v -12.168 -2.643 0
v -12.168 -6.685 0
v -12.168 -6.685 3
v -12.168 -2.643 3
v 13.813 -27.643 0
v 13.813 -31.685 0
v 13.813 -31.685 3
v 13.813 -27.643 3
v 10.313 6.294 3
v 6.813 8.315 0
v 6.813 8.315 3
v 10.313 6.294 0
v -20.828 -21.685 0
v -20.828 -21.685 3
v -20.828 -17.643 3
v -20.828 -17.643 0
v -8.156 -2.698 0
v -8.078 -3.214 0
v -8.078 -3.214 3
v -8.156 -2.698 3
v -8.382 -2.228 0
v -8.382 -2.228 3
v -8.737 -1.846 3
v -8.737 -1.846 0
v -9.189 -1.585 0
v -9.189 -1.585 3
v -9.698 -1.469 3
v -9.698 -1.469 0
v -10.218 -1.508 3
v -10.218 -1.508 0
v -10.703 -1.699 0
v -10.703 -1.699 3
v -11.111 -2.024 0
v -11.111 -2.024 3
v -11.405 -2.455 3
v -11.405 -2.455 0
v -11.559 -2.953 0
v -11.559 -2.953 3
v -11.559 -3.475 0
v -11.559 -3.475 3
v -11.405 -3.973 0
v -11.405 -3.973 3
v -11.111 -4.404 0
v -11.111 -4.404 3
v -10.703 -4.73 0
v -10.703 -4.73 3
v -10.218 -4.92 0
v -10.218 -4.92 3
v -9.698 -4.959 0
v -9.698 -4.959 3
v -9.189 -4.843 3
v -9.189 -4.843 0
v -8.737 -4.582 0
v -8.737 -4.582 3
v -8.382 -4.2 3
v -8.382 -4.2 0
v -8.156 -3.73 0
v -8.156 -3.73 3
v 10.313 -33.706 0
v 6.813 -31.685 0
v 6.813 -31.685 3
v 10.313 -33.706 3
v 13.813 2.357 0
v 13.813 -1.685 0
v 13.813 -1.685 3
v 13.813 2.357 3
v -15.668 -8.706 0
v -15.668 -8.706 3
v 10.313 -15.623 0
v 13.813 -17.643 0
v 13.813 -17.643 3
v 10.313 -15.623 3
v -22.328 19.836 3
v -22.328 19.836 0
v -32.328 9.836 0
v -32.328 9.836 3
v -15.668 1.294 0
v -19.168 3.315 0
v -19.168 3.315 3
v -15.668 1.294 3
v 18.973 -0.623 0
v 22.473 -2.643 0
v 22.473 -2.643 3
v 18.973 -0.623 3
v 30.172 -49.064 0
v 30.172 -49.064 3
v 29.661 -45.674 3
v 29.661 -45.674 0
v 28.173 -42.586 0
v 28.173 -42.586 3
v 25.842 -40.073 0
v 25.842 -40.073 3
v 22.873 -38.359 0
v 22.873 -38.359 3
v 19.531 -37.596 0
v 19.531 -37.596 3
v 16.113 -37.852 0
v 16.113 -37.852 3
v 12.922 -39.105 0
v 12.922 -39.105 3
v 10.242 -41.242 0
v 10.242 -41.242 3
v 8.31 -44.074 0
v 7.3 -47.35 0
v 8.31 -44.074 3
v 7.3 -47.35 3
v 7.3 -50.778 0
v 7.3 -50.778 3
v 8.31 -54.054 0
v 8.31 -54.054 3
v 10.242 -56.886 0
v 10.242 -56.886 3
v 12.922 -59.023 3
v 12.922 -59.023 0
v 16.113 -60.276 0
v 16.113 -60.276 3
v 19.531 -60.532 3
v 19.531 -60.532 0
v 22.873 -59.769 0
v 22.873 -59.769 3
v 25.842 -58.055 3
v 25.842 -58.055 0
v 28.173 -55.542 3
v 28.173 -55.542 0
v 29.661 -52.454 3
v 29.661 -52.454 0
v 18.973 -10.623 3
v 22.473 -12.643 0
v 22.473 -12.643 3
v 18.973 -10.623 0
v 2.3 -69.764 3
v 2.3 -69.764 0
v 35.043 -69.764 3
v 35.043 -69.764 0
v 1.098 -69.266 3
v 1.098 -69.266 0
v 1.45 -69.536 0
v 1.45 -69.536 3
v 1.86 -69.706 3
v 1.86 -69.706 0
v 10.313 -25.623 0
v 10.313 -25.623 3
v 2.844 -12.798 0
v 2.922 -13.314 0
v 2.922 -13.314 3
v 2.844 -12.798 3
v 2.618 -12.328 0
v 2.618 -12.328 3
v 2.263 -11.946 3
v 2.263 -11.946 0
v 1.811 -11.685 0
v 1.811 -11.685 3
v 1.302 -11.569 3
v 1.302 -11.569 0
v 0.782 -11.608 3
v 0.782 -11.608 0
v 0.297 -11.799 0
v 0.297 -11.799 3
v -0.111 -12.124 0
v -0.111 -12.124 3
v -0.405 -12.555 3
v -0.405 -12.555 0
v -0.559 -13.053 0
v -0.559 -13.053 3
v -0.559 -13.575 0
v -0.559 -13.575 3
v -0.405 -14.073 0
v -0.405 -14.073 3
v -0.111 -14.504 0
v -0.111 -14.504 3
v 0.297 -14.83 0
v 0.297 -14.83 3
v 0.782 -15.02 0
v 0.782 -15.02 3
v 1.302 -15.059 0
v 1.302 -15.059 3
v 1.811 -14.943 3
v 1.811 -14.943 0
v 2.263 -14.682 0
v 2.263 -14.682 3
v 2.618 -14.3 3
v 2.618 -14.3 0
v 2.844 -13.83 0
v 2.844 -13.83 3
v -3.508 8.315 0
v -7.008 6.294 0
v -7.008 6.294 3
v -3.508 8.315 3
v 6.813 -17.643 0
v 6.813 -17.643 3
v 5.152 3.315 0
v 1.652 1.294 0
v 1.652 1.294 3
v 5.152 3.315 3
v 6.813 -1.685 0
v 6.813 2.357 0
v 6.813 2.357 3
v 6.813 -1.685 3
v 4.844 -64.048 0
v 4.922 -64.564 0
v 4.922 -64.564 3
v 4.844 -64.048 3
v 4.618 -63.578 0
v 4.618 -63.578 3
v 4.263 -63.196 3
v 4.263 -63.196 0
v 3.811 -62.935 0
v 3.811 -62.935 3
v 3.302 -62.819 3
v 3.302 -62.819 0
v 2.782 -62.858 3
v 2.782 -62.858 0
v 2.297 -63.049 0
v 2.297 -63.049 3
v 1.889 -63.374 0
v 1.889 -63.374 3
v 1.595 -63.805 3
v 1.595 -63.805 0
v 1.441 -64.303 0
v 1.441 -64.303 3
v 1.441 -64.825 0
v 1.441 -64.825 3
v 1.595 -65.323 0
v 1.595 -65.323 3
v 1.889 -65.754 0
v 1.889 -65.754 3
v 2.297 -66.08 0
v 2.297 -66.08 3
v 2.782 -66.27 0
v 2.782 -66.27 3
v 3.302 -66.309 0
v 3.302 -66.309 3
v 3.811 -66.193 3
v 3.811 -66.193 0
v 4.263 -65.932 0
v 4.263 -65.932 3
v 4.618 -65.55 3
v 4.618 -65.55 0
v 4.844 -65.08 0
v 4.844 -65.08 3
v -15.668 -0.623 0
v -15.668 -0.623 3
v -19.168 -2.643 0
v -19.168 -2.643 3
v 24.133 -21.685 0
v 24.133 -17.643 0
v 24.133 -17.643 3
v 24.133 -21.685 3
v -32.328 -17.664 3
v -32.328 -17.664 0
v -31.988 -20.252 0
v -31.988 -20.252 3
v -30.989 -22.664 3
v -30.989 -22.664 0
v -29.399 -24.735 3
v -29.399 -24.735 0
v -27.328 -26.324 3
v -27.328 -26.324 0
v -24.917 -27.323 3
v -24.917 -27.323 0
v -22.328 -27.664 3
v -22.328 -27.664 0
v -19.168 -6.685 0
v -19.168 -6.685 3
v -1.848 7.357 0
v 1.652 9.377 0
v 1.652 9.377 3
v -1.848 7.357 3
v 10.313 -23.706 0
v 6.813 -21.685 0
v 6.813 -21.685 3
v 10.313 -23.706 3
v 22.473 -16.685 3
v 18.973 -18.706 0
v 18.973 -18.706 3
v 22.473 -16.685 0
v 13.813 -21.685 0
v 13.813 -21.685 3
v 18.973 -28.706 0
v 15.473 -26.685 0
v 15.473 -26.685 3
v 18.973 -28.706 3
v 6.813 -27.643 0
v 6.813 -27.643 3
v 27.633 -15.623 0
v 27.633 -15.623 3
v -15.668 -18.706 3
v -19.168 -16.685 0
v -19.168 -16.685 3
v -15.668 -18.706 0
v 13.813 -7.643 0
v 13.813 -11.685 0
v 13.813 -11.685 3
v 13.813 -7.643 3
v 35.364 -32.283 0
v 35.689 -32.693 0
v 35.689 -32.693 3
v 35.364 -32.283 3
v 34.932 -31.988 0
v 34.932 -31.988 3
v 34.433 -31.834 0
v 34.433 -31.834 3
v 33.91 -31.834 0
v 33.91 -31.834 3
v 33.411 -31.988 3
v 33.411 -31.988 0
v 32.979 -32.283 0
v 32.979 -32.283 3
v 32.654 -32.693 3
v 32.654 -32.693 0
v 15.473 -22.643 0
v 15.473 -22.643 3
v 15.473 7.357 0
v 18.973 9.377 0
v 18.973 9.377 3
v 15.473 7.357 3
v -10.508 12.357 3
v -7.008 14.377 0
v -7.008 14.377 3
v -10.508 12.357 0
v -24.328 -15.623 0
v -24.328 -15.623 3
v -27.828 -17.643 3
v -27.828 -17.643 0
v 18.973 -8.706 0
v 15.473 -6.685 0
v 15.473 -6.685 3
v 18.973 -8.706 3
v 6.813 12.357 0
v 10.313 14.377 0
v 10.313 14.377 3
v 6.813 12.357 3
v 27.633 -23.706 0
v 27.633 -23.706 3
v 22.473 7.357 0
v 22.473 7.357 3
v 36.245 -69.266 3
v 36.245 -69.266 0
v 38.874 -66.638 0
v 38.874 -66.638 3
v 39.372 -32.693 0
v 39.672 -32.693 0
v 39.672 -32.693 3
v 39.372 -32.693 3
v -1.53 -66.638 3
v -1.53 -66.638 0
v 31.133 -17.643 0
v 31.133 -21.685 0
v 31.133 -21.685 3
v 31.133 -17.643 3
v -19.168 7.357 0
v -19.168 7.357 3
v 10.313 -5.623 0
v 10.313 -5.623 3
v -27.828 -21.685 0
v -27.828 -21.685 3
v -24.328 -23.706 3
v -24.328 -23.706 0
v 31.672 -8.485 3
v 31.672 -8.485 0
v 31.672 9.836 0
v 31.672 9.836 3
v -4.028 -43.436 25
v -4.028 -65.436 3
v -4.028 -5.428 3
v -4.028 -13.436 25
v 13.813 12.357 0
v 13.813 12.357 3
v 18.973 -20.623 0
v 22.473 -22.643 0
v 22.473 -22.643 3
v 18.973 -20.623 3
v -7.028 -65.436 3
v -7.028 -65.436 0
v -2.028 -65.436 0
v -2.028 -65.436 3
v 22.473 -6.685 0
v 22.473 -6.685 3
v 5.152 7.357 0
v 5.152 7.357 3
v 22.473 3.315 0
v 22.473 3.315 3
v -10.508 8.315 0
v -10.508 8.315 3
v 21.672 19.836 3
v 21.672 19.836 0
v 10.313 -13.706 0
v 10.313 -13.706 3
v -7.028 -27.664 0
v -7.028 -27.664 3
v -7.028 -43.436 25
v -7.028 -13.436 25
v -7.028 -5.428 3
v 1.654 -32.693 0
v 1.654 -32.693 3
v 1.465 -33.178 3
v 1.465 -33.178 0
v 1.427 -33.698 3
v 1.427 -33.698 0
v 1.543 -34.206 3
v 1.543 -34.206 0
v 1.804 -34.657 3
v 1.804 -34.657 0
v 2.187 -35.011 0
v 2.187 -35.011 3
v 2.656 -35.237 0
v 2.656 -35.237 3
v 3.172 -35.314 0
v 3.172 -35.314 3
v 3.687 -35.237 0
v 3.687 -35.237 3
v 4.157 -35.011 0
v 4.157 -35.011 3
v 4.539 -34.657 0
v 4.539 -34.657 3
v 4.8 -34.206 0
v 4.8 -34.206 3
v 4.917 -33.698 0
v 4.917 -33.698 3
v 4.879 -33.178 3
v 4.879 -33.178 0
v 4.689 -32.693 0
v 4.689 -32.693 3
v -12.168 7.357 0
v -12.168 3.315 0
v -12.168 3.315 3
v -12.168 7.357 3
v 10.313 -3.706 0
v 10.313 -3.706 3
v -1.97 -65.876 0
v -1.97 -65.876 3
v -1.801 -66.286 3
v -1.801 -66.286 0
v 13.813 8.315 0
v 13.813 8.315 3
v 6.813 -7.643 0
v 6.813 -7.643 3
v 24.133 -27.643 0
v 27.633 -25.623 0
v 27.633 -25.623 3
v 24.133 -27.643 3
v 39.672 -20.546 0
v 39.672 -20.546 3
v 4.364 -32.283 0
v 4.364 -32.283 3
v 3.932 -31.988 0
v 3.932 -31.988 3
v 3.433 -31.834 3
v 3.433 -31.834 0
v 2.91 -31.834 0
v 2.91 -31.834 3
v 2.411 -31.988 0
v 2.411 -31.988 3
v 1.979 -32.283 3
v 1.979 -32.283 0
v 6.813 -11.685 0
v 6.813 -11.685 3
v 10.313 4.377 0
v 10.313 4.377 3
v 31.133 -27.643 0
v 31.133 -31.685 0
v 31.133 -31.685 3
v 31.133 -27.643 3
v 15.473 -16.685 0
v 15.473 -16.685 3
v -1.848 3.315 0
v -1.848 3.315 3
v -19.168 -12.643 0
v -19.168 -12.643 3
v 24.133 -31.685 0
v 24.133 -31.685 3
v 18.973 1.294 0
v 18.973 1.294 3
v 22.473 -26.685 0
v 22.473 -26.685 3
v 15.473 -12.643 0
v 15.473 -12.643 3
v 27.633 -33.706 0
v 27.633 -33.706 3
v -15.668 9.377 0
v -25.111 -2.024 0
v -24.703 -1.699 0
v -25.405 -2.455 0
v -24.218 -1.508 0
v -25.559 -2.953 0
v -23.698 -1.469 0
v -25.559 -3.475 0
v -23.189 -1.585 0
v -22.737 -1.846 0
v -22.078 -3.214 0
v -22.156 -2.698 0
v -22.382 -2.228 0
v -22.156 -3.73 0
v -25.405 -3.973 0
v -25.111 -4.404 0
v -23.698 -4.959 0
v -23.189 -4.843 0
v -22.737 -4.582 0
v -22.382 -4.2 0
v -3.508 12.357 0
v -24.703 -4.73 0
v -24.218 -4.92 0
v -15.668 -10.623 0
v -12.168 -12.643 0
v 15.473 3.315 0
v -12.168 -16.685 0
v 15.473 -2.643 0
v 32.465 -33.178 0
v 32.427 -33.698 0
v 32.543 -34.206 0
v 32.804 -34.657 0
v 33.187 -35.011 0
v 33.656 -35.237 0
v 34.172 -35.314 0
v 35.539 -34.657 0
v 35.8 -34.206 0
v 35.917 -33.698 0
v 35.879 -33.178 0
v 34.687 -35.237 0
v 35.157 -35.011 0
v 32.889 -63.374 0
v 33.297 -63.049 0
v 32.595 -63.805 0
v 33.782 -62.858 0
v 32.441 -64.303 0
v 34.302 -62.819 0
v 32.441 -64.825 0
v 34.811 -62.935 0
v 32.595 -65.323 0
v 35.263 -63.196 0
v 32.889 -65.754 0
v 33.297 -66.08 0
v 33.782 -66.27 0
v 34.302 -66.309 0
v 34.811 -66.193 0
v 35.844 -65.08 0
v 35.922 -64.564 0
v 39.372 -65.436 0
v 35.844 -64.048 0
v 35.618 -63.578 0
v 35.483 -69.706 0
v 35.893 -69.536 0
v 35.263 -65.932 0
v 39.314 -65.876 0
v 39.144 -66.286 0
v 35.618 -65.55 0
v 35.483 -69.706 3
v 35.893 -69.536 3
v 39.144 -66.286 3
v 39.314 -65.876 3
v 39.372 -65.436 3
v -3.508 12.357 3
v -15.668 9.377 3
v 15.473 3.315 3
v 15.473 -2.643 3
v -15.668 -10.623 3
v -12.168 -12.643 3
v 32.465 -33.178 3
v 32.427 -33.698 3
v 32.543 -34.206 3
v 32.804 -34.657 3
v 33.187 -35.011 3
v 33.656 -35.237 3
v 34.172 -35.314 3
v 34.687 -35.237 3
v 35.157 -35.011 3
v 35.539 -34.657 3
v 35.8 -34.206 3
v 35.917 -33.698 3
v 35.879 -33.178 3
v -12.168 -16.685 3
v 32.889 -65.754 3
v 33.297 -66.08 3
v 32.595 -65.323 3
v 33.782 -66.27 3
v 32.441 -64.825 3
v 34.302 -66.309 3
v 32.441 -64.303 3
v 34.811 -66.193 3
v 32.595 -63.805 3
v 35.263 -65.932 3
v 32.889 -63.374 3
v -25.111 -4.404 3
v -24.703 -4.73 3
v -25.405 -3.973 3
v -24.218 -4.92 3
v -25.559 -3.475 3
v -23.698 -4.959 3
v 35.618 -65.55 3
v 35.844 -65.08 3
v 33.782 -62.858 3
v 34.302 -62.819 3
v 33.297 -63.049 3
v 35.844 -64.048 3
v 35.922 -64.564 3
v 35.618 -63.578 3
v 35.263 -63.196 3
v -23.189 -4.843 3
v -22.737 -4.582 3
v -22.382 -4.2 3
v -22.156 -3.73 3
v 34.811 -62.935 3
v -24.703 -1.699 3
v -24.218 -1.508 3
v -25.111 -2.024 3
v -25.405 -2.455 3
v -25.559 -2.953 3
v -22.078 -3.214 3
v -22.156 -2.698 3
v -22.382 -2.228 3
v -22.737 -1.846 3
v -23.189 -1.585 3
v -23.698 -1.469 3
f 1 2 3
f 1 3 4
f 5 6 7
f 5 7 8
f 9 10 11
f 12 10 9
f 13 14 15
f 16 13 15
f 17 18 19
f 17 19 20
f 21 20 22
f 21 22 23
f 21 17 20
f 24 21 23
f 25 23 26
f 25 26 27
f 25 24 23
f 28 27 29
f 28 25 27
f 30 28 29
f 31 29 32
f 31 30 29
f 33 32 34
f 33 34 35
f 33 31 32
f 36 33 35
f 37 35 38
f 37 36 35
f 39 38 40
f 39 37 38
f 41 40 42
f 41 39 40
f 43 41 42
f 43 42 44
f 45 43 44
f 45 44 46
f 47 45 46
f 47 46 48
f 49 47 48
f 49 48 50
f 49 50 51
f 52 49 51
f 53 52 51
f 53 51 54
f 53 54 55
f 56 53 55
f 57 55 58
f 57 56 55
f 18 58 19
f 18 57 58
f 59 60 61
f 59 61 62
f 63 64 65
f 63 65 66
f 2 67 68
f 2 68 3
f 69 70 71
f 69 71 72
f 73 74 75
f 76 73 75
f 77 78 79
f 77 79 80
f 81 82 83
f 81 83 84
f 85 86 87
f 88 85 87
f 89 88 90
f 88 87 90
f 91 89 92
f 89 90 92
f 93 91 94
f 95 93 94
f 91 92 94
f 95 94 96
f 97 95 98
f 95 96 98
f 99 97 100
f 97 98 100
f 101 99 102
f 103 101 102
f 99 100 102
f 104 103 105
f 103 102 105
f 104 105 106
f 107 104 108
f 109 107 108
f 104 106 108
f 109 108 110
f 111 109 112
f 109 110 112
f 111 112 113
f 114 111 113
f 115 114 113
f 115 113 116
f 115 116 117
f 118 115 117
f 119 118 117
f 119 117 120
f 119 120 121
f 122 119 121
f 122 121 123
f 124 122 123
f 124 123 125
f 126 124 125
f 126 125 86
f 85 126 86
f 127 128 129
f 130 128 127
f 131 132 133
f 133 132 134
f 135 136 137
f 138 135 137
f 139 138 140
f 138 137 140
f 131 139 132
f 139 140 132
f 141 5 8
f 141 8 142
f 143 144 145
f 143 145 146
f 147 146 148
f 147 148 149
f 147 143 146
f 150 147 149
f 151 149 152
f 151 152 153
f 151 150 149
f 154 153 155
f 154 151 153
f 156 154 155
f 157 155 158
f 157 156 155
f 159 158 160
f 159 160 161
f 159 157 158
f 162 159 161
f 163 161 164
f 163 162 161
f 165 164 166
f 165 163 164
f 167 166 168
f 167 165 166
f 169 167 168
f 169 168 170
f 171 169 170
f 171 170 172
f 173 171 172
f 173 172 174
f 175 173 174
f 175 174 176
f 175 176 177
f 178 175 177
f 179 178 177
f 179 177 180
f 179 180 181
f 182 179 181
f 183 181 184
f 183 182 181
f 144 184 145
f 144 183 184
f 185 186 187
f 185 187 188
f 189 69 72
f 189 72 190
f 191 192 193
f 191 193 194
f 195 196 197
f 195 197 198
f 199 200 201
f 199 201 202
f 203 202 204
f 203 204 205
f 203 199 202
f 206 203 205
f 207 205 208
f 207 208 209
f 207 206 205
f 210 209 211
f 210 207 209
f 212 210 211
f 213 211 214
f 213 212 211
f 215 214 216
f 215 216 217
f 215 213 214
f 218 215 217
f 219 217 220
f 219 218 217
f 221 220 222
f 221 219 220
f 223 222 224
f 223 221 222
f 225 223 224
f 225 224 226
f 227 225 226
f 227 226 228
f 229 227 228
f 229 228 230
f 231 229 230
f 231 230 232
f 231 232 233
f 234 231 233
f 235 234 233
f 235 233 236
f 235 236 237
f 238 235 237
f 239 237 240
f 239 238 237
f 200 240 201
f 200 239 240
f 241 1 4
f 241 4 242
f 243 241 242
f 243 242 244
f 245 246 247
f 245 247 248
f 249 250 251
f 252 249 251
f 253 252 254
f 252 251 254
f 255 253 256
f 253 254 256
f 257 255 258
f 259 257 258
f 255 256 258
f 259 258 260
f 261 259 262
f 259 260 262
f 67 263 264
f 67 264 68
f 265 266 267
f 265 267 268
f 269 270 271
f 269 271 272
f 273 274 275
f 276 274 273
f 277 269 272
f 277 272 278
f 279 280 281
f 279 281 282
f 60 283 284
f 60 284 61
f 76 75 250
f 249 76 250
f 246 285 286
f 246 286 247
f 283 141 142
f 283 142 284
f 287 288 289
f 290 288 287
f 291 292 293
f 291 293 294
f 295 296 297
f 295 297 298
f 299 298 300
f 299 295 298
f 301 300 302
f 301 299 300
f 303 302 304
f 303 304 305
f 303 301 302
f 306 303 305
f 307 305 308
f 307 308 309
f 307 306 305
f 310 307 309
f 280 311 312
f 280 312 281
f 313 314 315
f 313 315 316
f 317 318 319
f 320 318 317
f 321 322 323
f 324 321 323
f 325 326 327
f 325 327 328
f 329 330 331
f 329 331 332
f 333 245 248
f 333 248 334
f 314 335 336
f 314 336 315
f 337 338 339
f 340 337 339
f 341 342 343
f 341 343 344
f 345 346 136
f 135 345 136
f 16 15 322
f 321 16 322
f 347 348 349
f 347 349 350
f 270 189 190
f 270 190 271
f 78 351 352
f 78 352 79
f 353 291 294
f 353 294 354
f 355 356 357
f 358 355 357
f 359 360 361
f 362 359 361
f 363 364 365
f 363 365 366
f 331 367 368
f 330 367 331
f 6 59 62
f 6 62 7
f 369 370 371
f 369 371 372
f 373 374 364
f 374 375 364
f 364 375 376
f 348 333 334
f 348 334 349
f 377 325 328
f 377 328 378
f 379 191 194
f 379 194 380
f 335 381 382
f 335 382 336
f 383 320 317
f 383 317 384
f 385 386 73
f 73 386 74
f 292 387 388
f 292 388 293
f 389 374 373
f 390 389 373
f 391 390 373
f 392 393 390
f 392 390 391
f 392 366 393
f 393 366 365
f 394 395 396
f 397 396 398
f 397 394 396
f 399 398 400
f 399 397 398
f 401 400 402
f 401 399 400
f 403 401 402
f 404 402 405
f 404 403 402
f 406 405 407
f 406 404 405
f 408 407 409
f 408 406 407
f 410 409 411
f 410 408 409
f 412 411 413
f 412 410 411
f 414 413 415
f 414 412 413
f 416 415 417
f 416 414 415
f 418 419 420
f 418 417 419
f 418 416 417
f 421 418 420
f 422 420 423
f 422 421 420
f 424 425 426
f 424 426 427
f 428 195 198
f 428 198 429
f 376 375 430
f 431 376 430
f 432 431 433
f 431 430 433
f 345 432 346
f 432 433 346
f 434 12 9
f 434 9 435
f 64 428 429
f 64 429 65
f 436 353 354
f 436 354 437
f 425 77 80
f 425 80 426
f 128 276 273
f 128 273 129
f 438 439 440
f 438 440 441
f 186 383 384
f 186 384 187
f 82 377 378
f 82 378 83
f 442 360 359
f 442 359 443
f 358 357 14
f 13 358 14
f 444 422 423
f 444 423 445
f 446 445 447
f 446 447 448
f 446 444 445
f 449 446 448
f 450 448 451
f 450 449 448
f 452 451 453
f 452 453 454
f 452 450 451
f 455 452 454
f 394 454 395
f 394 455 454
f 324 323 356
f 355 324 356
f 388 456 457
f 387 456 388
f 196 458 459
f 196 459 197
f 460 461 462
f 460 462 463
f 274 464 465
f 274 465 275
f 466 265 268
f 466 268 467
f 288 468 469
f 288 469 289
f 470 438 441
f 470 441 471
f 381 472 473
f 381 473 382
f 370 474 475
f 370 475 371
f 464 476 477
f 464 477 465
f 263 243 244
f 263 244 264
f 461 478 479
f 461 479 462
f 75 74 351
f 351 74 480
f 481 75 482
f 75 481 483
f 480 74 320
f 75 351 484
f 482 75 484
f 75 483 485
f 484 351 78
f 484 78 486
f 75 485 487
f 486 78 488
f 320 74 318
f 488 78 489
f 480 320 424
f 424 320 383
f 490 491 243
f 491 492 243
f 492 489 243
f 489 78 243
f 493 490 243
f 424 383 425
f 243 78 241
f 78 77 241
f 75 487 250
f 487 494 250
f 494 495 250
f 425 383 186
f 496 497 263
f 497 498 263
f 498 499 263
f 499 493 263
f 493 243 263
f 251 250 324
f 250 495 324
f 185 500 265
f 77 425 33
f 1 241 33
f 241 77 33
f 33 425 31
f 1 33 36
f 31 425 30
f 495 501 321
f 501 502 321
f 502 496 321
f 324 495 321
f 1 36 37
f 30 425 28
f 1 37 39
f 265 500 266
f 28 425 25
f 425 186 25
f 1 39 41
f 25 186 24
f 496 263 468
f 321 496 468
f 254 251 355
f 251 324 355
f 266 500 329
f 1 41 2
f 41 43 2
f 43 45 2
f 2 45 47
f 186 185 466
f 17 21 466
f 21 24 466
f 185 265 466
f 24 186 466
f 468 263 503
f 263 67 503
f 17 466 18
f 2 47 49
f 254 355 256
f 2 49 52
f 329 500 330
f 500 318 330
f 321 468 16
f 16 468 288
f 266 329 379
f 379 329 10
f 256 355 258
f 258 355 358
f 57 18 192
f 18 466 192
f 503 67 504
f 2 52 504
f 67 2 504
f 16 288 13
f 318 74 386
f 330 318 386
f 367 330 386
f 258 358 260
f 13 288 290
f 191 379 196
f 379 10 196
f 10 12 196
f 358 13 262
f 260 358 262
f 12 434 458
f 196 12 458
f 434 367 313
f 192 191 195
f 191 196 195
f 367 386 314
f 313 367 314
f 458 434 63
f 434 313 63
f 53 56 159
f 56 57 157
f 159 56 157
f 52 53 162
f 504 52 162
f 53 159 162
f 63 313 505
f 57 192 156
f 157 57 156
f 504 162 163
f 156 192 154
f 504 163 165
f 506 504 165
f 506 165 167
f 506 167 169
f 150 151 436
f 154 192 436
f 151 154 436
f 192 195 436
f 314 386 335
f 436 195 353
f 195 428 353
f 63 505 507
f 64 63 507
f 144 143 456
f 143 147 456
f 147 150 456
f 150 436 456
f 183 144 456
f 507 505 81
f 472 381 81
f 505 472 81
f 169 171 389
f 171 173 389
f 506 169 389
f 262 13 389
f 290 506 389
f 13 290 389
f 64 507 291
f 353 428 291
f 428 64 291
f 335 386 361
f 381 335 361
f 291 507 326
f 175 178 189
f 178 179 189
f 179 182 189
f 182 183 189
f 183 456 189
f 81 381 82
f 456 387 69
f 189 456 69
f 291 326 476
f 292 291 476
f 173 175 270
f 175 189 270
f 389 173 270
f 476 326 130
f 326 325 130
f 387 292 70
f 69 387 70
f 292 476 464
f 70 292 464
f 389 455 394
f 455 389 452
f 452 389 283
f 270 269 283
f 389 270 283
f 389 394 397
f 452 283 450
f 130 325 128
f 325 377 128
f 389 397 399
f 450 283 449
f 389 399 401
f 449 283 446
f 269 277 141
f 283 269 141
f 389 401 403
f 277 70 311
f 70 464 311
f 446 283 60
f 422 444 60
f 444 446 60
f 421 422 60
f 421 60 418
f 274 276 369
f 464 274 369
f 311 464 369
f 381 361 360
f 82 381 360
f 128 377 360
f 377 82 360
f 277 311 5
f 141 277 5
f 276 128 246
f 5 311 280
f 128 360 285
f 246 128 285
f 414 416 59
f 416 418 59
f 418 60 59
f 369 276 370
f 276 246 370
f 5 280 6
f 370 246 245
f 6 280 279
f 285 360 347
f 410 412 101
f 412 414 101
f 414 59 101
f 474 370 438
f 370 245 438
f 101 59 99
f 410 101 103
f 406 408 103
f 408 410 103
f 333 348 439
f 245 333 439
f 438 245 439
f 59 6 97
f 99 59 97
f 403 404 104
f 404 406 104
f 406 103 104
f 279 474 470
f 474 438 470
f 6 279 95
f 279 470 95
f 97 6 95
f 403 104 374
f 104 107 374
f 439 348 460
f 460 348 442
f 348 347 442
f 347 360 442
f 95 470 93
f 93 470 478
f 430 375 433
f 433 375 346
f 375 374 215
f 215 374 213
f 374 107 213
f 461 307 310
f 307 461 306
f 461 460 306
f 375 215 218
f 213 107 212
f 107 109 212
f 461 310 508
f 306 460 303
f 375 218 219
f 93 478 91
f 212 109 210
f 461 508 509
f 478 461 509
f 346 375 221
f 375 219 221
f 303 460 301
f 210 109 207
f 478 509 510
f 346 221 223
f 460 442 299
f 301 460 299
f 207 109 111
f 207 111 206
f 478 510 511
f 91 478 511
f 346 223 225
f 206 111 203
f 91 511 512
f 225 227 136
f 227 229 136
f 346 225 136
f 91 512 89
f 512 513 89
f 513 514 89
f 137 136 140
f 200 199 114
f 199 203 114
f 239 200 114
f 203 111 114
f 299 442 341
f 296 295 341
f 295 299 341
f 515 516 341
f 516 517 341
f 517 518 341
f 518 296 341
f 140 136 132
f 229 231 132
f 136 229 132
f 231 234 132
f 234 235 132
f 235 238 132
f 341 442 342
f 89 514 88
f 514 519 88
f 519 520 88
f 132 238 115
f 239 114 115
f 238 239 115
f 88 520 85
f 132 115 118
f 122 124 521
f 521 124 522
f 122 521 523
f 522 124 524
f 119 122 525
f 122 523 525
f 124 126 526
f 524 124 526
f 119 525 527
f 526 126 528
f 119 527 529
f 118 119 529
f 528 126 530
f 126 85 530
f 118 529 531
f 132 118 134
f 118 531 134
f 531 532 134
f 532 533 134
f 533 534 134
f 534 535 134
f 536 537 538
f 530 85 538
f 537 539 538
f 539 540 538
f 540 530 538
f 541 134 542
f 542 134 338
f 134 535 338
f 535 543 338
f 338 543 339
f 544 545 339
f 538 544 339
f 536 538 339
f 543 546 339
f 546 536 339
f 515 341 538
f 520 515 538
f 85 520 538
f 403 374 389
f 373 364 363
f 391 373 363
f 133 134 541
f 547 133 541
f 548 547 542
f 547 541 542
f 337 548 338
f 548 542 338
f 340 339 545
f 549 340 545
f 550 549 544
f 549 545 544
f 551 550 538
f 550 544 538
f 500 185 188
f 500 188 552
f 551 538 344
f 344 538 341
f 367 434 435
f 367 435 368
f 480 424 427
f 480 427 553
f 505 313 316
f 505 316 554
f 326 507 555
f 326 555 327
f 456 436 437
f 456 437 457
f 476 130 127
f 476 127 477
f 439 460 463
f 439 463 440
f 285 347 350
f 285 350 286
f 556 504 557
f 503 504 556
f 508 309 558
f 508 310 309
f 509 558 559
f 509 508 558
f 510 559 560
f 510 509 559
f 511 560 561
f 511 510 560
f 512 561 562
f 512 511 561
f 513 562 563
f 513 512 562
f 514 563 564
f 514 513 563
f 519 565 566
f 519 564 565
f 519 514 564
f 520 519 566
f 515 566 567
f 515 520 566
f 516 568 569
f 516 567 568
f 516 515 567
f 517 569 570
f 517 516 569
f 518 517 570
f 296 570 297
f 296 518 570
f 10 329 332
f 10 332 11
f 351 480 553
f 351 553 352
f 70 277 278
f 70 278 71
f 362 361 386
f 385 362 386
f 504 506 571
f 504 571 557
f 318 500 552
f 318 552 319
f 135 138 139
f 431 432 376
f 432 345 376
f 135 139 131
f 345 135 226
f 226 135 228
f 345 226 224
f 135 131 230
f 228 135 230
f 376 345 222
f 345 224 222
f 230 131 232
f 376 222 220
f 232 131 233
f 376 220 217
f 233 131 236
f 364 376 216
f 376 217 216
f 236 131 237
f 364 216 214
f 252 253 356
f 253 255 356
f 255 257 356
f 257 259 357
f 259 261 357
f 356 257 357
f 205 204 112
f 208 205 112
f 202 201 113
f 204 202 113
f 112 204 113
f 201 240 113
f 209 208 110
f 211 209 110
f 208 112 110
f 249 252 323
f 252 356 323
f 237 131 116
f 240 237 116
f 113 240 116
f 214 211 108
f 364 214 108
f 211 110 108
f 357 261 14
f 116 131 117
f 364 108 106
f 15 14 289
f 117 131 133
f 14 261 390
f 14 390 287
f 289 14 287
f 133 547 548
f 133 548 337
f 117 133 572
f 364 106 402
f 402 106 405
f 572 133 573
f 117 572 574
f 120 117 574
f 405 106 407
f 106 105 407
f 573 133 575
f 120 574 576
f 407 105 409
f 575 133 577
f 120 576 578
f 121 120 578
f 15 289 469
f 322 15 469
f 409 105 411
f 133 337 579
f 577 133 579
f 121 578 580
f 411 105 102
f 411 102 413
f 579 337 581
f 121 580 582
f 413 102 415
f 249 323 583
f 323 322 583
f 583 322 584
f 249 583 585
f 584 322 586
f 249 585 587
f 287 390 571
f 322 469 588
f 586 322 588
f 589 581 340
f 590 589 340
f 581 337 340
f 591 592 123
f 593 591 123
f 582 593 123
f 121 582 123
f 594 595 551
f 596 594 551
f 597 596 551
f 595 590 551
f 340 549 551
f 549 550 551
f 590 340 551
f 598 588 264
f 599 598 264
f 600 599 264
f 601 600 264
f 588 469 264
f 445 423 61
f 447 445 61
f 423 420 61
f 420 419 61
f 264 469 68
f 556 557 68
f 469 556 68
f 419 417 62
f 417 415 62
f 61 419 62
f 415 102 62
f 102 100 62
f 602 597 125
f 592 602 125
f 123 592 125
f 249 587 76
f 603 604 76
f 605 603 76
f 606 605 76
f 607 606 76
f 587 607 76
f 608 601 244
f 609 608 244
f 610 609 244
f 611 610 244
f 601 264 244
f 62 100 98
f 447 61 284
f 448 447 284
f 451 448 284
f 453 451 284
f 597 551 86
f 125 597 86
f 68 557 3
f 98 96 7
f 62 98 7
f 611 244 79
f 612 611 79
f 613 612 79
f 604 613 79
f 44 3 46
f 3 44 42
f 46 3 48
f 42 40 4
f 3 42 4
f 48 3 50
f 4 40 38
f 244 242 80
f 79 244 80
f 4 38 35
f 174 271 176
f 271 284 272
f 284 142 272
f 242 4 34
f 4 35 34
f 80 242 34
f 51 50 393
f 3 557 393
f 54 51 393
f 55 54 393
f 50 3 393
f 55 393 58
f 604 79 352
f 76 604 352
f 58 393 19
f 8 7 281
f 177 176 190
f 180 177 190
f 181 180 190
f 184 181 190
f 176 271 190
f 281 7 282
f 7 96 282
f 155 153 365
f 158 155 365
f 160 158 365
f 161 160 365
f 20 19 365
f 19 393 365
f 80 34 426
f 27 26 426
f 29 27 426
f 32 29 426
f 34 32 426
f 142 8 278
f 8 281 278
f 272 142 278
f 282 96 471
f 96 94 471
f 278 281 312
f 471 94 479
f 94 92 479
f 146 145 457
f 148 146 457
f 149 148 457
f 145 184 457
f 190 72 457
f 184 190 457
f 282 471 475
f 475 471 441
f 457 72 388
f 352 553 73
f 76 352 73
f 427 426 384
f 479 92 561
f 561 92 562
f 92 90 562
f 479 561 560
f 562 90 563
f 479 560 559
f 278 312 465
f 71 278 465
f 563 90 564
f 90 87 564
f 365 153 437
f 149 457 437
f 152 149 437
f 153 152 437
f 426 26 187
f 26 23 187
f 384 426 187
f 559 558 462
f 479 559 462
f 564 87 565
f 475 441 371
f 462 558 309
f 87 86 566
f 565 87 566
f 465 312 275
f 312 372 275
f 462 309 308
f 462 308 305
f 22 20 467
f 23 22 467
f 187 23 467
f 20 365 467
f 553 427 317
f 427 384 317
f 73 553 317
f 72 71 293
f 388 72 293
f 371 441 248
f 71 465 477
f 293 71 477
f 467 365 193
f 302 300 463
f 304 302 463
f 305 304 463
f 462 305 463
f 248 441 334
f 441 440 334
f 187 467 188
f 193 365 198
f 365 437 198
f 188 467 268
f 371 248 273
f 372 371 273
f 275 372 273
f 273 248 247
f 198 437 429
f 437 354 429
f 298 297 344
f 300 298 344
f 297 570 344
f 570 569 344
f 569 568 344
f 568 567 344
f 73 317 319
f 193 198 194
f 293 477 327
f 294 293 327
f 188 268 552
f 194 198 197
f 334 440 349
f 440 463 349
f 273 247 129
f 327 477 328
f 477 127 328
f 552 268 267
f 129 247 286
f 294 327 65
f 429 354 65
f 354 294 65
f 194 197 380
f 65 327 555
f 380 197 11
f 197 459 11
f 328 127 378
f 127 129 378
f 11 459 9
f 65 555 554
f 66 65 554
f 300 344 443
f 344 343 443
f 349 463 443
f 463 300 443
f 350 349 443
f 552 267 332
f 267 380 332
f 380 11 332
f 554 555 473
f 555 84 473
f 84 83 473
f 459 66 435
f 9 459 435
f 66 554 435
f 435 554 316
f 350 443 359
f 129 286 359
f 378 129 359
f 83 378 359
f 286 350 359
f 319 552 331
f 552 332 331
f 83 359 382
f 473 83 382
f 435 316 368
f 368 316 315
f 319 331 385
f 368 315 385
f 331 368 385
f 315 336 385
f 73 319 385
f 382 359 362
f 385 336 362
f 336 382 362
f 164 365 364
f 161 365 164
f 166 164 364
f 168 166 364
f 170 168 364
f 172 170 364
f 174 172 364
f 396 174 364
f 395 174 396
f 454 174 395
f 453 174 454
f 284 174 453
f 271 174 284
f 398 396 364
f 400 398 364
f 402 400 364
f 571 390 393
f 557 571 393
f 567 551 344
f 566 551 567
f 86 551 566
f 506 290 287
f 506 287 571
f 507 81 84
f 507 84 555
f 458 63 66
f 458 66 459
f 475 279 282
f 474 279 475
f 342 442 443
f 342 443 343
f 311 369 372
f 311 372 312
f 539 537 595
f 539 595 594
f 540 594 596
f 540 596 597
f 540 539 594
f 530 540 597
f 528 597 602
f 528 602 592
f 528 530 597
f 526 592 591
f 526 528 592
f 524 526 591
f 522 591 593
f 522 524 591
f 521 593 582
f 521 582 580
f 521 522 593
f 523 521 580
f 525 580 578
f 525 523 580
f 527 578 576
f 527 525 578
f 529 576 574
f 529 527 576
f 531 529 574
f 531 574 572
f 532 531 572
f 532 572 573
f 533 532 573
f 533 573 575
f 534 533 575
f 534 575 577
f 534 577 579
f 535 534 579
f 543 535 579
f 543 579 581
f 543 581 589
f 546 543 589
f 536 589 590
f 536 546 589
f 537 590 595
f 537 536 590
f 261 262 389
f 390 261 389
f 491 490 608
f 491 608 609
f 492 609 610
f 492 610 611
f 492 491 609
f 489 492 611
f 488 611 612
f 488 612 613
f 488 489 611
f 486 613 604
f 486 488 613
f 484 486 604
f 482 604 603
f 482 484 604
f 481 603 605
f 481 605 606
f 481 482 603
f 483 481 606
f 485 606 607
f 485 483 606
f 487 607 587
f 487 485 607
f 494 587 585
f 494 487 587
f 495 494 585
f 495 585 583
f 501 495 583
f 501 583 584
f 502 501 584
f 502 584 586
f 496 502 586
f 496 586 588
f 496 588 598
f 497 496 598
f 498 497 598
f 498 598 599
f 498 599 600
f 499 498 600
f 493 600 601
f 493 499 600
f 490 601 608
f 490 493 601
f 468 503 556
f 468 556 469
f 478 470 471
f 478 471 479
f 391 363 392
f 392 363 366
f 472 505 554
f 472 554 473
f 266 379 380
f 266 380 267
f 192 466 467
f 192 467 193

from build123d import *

# Parameters (mm, degrees)
SKETCH2_R               = 1.75
BOSS_EXTRUDE1_DEPTH     = 3
BOSS_EXTRUDE1_2_DEPTH   = 3
BOSS_EXTRUDE2_START     = -3
BOSS_EXTRUDE2_DEPTH     = 3
SKETCH5_W               = 3
SKETCH5_H               = 37.771572876
BOSS_EXTRUDE3_DEPTH     = 2
BOSS_EXTRUDE4_DEPTH     = 3
CUT_EXTRUDE1_DEPTH      = 10
SKETCH9_R               = 11.5
CUT_EXTRUDE2_DEPTH      = 10
FILL_PATTERN1_OUTLINE_R = 1.75
FILL_PATTERN1_DEPTH     = 3


# Read off the part's stored shape, not the designer's step: Fill Pattern1
with BuildPart() as part:
    # Sketch2 → Boss-Extrude1 (new body)
    with BuildSketch(Plane.XY):
        with BuildLine():
            Line((31.67162959, -17.664113805), (31.67162959, 9.835886195))
            Line((31.67162959, 9.835886195), (21.67162959, 19.835886195))
            Line((21.67162959, 19.835886195), (-22.32837041, 19.835886195))
            Line((-22.32837041, 19.835886195), (-32.32837041, 9.835886195))
            Line((-32.32837041, 9.835886195), (-32.32837041, -17.664113805))
            ThreePointArc((-32.32837041, -17.664113805), (-29.399438222, -24.735181617), (-22.32837041, -27.664113805))
            Line((-22.32837041, -27.664113805), (21.67162959, -27.664113805))
            ThreePointArc((21.67162959, -27.664113805), (28.742697402, -24.735181617), (31.67162959, -17.664113805))
        make_face()
        with Locations((18.67162959, 5.585886195)):
            Circle(SKETCH2_R, mode=Mode.SUBTRACT)
        with Locations((1.17162959, -13.314113805)):
            Circle(SKETCH2_R, mode=Mode.SUBTRACT)
        with Locations((-23.82837041, -3.214113805)):
            Circle(SKETCH2_R, mode=Mode.SUBTRACT)
        with Locations((-9.82837041, -3.214113805)):
            Circle(SKETCH2_R, mode=Mode.SUBTRACT)
    extrude(amount=BOSS_EXTRUDE1_DEPTH)



with BuildPart() as body_2:
    # Sketch2 → Boss-Extrude1 2 (new body)
    with BuildSketch(Plane.XY):
        with BuildLine():
            Line((-2.02837041, -32.69254093), (-2.02837041, -65.435686681))
            ThreePointArc((-2.02837041, -65.435686681), (-1.898965615, -66.086248516), (-1.530451938, -66.637768209))
            Line((-1.530451938, -66.637768209), (1.097975187, -69.266195333))
            ThreePointArc((1.097975187, -69.266195333), (1.64949488, -69.634709011), (2.300056715, -69.764113805))
            Line((2.300056715, -69.764113805), (35.043202465, -69.764113805))
            ThreePointArc((35.043202465, -69.764113805), (35.6937643, -69.634709011), (36.245283993, -69.266195333))
            Line((36.245283993, -69.266195333), (38.873711118, -66.637768209))
            ThreePointArc((38.873711118, -66.637768209), (39.242224795, -66.086248516), (39.37162959, -65.435686681))
            Line((39.37162959, -65.435686681), (39.37162959, -32.69254093))
            ThreePointArc((39.37162959, -32.69254093), (39.242224795, -32.041979095), (38.873711118, -31.490459402))
            Line((38.873711118, -31.490459402), (36.245283993, -28.862032277))
            ThreePointArc((36.245283993, -28.862032277), (35.6937643, -28.4935186), (35.043202465, -28.364113805))
            Line((35.043202465, -28.364113805), (2.300056715, -28.364113805))
            ThreePointArc((2.300056715, -28.364113805), (1.64949488, -28.4935186), (1.097975187, -28.862032277))
            Line((1.097975187, -28.862032277), (-1.530451938, -31.490459402))
            ThreePointArc((-1.530451938, -31.490459402), (-1.898965615, -32.041979095), (-2.02837041, -32.69254093))
        make_face()
        with Locations((34.17162959, -33.564113805)):
            Circle(SKETCH2_R, mode=Mode.SUBTRACT)
        with Locations((3.17162959, -33.564113805)):
            Circle(SKETCH2_R, mode=Mode.SUBTRACT)
        with Locations((34.17162959, -64.564113805)):
            Circle(SKETCH2_R, mode=Mode.SUBTRACT)
        with Locations((3.17162959, -64.564113805)):
            Circle(SKETCH2_R, mode=Mode.SUBTRACT)
    extrude(amount=BOSS_EXTRUDE1_2_DEPTH)


with BuildPart() as part_1:
    add(part.part)

    add(body_2.part)  # Boss-Extrude2 merges body 2
    # Sketch3 → Boss-Extrude2 (add)
    with BuildSketch(Plane.XY.offset(3).offset(BOSS_EXTRUDE2_START)):
        with BuildLine():
            Line((-2.02837041, -32.69254093), (-2.02837041, -27.664113805))
            Line((-2.02837041, -27.664113805), (21.67162959, -27.664113805))
            ThreePointArc((21.67162959, -27.664113805), (28.742697402, -24.735181617), (31.67162959, -17.664113805))
            Line((31.67162959, -17.664113805), (31.67162959, -8.484617852))
            Line((31.67162959, -8.484617852), (39.67162959, -20.545709175))
            Line((39.67162959, -20.545709175), (39.67162959, -32.69254093))
            Line((39.67162959, -32.69254093), (35.689147538, -32.69254093))
            ThreePointArc((35.689147538, -32.69254093), (34.17162959, -31.814113805), (32.654111642, -32.69254093))
            Line((32.654111642, -32.69254093), (4.689147538, -32.69254093))
            ThreePointArc((4.689147538, -32.69254093), (3.17162959, -31.814113805), (1.654111642, -32.69254093))
            Line((1.654111642, -32.69254093), (-2.02837041, -32.69254093))
        make_face()
    extrude(amount=BOSS_EXTRUDE2_DEPTH)

    # Sketch5 → Boss-Extrude3 (add)
    with BuildSketch(Plane.ZY.offset(2.02837041)):
        with Locations((1.5, -46.549900243)):
            Rectangle(SKETCH5_W, SKETCH5_H)
    extrude(amount=BOSS_EXTRUDE3_DEPTH)

    # Sketch6 → Boss-Extrude4 (add)
    with BuildSketch(Plane.ZY.offset(4.02837041)):
        Polygon((3, -27.664113805), (0, -27.664113805), (0, -65.435686681), (3, -65.435686681), (25, -43.435686681), (25, -13.435686681), (3, -5.428341527), align=None)
    extrude(amount=BOSS_EXTRUDE4_DEPTH)

    # Sketch7 → Cut-Extrude1 (cut)
    with BuildSketch(Plane.XY.offset(3)):
        Polygon((-24.32837041, -23.70556569), (-20.82837041, -21.684839748), (-20.82837041, -17.643387863), (-24.32837041, -15.622661921), (-27.82837041, -17.643387863), (-27.82837041, -21.684839748), align=None)
    extrude(amount=-CUT_EXTRUDE1_DEPTH, mode=Mode.SUBTRACT)

    # Sketch9 → Cut-Extrude2 (cut)
    with BuildSketch(Plane.XY.offset(3)):
        with Locations((18.67162959, -49.064113805)):
            Circle(SKETCH9_R)
    extrude(amount=-CUT_EXTRUDE2_DEPTH, mode=Mode.SUBTRACT)

    # Fill Pattern1 outline → Fill Pattern1 (cut)
    # profile 1 of 16: a face of its own
    with BuildSketch(Plane.XY):
        Polygon((13.812645741, 2.356612137), (10.312645741, 4.377338079), (6.812645741, 2.356612137), (6.812645741, -1.684839748), (10.312645741, -3.70556569), (13.812645741, -1.684839748), align=None)
    # profile 2 of 16: a face of its own
    with BuildSketch(Plane.XY):
        Polygon((22.472899779, 7.356612137), (18.972899779, 9.377338079), (15.472899779, 7.356612137), (15.472899779, 3.315160252), (18.972899779, 1.29443431), (22.472899779, 3.315160252), align=None)
        with Locations((18.67162959, 5.585886195)):
            Circle(FILL_PATTERN1_OUTLINE_R, mode=Mode.SUBTRACT)
    # profile 3 of 16: a face of its own
    with BuildSketch(Plane.XY):
        Polygon((-12.168116372, -12.643387863), (-15.668116372, -10.622661921), (-19.168116372, -12.643387863), (-19.168116372, -16.684839748), (-15.668116372, -18.70556569), (-12.168116372, -16.684839748), align=None)
    # profile 4 of 16: a face of its own
    with BuildSketch(Plane.XY):
        Polygon((6.812645741, -27.643387863), (6.812645741, -31.684839748), (10.312645741, -33.70556569), (13.812645741, -31.684839748), (13.812645741, -27.643387863), (10.312645741, -25.622661921), align=None)
    # profile 5 of 16: a face of its own
    with BuildSketch(Plane.XY):
        Polygon((10.312645741, 14.377338079), (6.812645741, 12.356612137), (6.812645741, 8.315160252), (10.312645741, 6.29443431), (13.812645741, 8.315160252), (13.812645741, 12.356612137), align=None)
    # profile 6 of 16: a face of its own
    with BuildSketch(Plane.XY):
        Polygon((10.312645741, -15.622661921), (6.812645741, -17.643387863), (6.812645741, -21.684839748), (10.312645741, -23.70556569), (13.812645741, -21.684839748), (13.812645741, -17.643387863), align=None)
    # profile 7 of 16: a face of its own
    with BuildSketch(Plane.XY):
        Polygon((10.312645741, -5.622661921), (6.812645741, -7.643387863), (6.812645741, -11.684839748), (10.312645741, -13.70556569), (13.812645741, -11.684839748), (13.812645741, -7.643387863), align=None)
    # profile 8 of 16: a face of its own
    with BuildSketch(Plane.XY):
        Polygon((22.472899779, -22.643387863), (18.972899779, -20.622661921), (15.472899779, -22.643387863), (15.472899779, -26.684839748), (18.972899779, -28.70556569), (22.472899779, -26.684839748), align=None)
    # profile 9 of 16: a face of its own
    with BuildSketch(Plane.XY):
        Polygon((31.133153817, -17.643387863), (27.633153817, -15.622661921), (24.133153817, -17.643387863), (24.133153817, -21.684839748), (27.633153817, -23.70556569), (31.133153817, -21.684839748), align=None)
    # profile 10 of 16: a face of its own
    with BuildSketch(Plane.XY):
        Polygon((-1.847608297, 7.356612137), (-1.847608297, 3.315160252), (1.652391703, 1.29443431), (5.152391703, 3.315160252), (5.152391703, 7.356612137), (1.652391703, 9.377338079), align=None)
    # profile 11 of 16: a face of its own
    with BuildSketch(Plane.XY):
        Polygon((15.472899779, -2.643387863), (15.472899779, -6.684839748), (18.972899779, -8.70556569), (22.472899779, -6.684839748), (22.472899779, -2.643387863), (18.972899779, -0.622661921), align=None)
    # profile 12 of 16: a face of its own
    with BuildSketch(Plane.XY):
        Polygon((-10.507862334, 12.356612137), (-10.507862334, 8.315160252), (-7.007862334, 6.29443431), (-3.507862334, 8.315160252), (-3.507862334, 12.356612137), (-7.007862334, 14.377338079), align=None)
    # profile 13 of 16: a face of its own
    with BuildSketch(Plane.XY):
        Polygon((-12.168116372, -2.643387863), (-15.668116372, -0.622661921), (-19.168116372, -2.643387863), (-19.168116372, -6.684839748), (-15.668116372, -8.70556569), (-12.168116372, -6.684839748), align=None)
    # profile 14 of 16: a face of its own
    with BuildSketch(Plane.XY):
        Polygon((18.972899779, -10.622661921), (15.472899779, -12.643387863), (15.472899779, -16.684839748), (18.972899779, -18.70556569), (22.472899779, -16.684839748), (22.472899779, -12.643387863), align=None)
    # profile 15 of 16: a face of its own
    with BuildSketch(Plane.XY):
        Polygon((-19.168116372, 7.356612137), (-19.168116372, 3.315160252), (-15.668116372, 1.29443431), (-12.168116372, 3.315160252), (-12.168116372, 7.356612137), (-15.668116372, 9.377338079), align=None)
    # profile 16 of 16: a face of its own
    with BuildSketch(Plane.XY):
        Polygon((24.133153817, -27.643387863), (24.133153817, -31.684839748), (27.633153817, -33.70556569), (31.133153817, -31.684839748), (31.133153817, -27.643387863), (27.633153817, -25.622661921), align=None)
    extrude(amount=FILL_PATTERN1_DEPTH, mode=Mode.SUBTRACT)


solid = part_1.part
